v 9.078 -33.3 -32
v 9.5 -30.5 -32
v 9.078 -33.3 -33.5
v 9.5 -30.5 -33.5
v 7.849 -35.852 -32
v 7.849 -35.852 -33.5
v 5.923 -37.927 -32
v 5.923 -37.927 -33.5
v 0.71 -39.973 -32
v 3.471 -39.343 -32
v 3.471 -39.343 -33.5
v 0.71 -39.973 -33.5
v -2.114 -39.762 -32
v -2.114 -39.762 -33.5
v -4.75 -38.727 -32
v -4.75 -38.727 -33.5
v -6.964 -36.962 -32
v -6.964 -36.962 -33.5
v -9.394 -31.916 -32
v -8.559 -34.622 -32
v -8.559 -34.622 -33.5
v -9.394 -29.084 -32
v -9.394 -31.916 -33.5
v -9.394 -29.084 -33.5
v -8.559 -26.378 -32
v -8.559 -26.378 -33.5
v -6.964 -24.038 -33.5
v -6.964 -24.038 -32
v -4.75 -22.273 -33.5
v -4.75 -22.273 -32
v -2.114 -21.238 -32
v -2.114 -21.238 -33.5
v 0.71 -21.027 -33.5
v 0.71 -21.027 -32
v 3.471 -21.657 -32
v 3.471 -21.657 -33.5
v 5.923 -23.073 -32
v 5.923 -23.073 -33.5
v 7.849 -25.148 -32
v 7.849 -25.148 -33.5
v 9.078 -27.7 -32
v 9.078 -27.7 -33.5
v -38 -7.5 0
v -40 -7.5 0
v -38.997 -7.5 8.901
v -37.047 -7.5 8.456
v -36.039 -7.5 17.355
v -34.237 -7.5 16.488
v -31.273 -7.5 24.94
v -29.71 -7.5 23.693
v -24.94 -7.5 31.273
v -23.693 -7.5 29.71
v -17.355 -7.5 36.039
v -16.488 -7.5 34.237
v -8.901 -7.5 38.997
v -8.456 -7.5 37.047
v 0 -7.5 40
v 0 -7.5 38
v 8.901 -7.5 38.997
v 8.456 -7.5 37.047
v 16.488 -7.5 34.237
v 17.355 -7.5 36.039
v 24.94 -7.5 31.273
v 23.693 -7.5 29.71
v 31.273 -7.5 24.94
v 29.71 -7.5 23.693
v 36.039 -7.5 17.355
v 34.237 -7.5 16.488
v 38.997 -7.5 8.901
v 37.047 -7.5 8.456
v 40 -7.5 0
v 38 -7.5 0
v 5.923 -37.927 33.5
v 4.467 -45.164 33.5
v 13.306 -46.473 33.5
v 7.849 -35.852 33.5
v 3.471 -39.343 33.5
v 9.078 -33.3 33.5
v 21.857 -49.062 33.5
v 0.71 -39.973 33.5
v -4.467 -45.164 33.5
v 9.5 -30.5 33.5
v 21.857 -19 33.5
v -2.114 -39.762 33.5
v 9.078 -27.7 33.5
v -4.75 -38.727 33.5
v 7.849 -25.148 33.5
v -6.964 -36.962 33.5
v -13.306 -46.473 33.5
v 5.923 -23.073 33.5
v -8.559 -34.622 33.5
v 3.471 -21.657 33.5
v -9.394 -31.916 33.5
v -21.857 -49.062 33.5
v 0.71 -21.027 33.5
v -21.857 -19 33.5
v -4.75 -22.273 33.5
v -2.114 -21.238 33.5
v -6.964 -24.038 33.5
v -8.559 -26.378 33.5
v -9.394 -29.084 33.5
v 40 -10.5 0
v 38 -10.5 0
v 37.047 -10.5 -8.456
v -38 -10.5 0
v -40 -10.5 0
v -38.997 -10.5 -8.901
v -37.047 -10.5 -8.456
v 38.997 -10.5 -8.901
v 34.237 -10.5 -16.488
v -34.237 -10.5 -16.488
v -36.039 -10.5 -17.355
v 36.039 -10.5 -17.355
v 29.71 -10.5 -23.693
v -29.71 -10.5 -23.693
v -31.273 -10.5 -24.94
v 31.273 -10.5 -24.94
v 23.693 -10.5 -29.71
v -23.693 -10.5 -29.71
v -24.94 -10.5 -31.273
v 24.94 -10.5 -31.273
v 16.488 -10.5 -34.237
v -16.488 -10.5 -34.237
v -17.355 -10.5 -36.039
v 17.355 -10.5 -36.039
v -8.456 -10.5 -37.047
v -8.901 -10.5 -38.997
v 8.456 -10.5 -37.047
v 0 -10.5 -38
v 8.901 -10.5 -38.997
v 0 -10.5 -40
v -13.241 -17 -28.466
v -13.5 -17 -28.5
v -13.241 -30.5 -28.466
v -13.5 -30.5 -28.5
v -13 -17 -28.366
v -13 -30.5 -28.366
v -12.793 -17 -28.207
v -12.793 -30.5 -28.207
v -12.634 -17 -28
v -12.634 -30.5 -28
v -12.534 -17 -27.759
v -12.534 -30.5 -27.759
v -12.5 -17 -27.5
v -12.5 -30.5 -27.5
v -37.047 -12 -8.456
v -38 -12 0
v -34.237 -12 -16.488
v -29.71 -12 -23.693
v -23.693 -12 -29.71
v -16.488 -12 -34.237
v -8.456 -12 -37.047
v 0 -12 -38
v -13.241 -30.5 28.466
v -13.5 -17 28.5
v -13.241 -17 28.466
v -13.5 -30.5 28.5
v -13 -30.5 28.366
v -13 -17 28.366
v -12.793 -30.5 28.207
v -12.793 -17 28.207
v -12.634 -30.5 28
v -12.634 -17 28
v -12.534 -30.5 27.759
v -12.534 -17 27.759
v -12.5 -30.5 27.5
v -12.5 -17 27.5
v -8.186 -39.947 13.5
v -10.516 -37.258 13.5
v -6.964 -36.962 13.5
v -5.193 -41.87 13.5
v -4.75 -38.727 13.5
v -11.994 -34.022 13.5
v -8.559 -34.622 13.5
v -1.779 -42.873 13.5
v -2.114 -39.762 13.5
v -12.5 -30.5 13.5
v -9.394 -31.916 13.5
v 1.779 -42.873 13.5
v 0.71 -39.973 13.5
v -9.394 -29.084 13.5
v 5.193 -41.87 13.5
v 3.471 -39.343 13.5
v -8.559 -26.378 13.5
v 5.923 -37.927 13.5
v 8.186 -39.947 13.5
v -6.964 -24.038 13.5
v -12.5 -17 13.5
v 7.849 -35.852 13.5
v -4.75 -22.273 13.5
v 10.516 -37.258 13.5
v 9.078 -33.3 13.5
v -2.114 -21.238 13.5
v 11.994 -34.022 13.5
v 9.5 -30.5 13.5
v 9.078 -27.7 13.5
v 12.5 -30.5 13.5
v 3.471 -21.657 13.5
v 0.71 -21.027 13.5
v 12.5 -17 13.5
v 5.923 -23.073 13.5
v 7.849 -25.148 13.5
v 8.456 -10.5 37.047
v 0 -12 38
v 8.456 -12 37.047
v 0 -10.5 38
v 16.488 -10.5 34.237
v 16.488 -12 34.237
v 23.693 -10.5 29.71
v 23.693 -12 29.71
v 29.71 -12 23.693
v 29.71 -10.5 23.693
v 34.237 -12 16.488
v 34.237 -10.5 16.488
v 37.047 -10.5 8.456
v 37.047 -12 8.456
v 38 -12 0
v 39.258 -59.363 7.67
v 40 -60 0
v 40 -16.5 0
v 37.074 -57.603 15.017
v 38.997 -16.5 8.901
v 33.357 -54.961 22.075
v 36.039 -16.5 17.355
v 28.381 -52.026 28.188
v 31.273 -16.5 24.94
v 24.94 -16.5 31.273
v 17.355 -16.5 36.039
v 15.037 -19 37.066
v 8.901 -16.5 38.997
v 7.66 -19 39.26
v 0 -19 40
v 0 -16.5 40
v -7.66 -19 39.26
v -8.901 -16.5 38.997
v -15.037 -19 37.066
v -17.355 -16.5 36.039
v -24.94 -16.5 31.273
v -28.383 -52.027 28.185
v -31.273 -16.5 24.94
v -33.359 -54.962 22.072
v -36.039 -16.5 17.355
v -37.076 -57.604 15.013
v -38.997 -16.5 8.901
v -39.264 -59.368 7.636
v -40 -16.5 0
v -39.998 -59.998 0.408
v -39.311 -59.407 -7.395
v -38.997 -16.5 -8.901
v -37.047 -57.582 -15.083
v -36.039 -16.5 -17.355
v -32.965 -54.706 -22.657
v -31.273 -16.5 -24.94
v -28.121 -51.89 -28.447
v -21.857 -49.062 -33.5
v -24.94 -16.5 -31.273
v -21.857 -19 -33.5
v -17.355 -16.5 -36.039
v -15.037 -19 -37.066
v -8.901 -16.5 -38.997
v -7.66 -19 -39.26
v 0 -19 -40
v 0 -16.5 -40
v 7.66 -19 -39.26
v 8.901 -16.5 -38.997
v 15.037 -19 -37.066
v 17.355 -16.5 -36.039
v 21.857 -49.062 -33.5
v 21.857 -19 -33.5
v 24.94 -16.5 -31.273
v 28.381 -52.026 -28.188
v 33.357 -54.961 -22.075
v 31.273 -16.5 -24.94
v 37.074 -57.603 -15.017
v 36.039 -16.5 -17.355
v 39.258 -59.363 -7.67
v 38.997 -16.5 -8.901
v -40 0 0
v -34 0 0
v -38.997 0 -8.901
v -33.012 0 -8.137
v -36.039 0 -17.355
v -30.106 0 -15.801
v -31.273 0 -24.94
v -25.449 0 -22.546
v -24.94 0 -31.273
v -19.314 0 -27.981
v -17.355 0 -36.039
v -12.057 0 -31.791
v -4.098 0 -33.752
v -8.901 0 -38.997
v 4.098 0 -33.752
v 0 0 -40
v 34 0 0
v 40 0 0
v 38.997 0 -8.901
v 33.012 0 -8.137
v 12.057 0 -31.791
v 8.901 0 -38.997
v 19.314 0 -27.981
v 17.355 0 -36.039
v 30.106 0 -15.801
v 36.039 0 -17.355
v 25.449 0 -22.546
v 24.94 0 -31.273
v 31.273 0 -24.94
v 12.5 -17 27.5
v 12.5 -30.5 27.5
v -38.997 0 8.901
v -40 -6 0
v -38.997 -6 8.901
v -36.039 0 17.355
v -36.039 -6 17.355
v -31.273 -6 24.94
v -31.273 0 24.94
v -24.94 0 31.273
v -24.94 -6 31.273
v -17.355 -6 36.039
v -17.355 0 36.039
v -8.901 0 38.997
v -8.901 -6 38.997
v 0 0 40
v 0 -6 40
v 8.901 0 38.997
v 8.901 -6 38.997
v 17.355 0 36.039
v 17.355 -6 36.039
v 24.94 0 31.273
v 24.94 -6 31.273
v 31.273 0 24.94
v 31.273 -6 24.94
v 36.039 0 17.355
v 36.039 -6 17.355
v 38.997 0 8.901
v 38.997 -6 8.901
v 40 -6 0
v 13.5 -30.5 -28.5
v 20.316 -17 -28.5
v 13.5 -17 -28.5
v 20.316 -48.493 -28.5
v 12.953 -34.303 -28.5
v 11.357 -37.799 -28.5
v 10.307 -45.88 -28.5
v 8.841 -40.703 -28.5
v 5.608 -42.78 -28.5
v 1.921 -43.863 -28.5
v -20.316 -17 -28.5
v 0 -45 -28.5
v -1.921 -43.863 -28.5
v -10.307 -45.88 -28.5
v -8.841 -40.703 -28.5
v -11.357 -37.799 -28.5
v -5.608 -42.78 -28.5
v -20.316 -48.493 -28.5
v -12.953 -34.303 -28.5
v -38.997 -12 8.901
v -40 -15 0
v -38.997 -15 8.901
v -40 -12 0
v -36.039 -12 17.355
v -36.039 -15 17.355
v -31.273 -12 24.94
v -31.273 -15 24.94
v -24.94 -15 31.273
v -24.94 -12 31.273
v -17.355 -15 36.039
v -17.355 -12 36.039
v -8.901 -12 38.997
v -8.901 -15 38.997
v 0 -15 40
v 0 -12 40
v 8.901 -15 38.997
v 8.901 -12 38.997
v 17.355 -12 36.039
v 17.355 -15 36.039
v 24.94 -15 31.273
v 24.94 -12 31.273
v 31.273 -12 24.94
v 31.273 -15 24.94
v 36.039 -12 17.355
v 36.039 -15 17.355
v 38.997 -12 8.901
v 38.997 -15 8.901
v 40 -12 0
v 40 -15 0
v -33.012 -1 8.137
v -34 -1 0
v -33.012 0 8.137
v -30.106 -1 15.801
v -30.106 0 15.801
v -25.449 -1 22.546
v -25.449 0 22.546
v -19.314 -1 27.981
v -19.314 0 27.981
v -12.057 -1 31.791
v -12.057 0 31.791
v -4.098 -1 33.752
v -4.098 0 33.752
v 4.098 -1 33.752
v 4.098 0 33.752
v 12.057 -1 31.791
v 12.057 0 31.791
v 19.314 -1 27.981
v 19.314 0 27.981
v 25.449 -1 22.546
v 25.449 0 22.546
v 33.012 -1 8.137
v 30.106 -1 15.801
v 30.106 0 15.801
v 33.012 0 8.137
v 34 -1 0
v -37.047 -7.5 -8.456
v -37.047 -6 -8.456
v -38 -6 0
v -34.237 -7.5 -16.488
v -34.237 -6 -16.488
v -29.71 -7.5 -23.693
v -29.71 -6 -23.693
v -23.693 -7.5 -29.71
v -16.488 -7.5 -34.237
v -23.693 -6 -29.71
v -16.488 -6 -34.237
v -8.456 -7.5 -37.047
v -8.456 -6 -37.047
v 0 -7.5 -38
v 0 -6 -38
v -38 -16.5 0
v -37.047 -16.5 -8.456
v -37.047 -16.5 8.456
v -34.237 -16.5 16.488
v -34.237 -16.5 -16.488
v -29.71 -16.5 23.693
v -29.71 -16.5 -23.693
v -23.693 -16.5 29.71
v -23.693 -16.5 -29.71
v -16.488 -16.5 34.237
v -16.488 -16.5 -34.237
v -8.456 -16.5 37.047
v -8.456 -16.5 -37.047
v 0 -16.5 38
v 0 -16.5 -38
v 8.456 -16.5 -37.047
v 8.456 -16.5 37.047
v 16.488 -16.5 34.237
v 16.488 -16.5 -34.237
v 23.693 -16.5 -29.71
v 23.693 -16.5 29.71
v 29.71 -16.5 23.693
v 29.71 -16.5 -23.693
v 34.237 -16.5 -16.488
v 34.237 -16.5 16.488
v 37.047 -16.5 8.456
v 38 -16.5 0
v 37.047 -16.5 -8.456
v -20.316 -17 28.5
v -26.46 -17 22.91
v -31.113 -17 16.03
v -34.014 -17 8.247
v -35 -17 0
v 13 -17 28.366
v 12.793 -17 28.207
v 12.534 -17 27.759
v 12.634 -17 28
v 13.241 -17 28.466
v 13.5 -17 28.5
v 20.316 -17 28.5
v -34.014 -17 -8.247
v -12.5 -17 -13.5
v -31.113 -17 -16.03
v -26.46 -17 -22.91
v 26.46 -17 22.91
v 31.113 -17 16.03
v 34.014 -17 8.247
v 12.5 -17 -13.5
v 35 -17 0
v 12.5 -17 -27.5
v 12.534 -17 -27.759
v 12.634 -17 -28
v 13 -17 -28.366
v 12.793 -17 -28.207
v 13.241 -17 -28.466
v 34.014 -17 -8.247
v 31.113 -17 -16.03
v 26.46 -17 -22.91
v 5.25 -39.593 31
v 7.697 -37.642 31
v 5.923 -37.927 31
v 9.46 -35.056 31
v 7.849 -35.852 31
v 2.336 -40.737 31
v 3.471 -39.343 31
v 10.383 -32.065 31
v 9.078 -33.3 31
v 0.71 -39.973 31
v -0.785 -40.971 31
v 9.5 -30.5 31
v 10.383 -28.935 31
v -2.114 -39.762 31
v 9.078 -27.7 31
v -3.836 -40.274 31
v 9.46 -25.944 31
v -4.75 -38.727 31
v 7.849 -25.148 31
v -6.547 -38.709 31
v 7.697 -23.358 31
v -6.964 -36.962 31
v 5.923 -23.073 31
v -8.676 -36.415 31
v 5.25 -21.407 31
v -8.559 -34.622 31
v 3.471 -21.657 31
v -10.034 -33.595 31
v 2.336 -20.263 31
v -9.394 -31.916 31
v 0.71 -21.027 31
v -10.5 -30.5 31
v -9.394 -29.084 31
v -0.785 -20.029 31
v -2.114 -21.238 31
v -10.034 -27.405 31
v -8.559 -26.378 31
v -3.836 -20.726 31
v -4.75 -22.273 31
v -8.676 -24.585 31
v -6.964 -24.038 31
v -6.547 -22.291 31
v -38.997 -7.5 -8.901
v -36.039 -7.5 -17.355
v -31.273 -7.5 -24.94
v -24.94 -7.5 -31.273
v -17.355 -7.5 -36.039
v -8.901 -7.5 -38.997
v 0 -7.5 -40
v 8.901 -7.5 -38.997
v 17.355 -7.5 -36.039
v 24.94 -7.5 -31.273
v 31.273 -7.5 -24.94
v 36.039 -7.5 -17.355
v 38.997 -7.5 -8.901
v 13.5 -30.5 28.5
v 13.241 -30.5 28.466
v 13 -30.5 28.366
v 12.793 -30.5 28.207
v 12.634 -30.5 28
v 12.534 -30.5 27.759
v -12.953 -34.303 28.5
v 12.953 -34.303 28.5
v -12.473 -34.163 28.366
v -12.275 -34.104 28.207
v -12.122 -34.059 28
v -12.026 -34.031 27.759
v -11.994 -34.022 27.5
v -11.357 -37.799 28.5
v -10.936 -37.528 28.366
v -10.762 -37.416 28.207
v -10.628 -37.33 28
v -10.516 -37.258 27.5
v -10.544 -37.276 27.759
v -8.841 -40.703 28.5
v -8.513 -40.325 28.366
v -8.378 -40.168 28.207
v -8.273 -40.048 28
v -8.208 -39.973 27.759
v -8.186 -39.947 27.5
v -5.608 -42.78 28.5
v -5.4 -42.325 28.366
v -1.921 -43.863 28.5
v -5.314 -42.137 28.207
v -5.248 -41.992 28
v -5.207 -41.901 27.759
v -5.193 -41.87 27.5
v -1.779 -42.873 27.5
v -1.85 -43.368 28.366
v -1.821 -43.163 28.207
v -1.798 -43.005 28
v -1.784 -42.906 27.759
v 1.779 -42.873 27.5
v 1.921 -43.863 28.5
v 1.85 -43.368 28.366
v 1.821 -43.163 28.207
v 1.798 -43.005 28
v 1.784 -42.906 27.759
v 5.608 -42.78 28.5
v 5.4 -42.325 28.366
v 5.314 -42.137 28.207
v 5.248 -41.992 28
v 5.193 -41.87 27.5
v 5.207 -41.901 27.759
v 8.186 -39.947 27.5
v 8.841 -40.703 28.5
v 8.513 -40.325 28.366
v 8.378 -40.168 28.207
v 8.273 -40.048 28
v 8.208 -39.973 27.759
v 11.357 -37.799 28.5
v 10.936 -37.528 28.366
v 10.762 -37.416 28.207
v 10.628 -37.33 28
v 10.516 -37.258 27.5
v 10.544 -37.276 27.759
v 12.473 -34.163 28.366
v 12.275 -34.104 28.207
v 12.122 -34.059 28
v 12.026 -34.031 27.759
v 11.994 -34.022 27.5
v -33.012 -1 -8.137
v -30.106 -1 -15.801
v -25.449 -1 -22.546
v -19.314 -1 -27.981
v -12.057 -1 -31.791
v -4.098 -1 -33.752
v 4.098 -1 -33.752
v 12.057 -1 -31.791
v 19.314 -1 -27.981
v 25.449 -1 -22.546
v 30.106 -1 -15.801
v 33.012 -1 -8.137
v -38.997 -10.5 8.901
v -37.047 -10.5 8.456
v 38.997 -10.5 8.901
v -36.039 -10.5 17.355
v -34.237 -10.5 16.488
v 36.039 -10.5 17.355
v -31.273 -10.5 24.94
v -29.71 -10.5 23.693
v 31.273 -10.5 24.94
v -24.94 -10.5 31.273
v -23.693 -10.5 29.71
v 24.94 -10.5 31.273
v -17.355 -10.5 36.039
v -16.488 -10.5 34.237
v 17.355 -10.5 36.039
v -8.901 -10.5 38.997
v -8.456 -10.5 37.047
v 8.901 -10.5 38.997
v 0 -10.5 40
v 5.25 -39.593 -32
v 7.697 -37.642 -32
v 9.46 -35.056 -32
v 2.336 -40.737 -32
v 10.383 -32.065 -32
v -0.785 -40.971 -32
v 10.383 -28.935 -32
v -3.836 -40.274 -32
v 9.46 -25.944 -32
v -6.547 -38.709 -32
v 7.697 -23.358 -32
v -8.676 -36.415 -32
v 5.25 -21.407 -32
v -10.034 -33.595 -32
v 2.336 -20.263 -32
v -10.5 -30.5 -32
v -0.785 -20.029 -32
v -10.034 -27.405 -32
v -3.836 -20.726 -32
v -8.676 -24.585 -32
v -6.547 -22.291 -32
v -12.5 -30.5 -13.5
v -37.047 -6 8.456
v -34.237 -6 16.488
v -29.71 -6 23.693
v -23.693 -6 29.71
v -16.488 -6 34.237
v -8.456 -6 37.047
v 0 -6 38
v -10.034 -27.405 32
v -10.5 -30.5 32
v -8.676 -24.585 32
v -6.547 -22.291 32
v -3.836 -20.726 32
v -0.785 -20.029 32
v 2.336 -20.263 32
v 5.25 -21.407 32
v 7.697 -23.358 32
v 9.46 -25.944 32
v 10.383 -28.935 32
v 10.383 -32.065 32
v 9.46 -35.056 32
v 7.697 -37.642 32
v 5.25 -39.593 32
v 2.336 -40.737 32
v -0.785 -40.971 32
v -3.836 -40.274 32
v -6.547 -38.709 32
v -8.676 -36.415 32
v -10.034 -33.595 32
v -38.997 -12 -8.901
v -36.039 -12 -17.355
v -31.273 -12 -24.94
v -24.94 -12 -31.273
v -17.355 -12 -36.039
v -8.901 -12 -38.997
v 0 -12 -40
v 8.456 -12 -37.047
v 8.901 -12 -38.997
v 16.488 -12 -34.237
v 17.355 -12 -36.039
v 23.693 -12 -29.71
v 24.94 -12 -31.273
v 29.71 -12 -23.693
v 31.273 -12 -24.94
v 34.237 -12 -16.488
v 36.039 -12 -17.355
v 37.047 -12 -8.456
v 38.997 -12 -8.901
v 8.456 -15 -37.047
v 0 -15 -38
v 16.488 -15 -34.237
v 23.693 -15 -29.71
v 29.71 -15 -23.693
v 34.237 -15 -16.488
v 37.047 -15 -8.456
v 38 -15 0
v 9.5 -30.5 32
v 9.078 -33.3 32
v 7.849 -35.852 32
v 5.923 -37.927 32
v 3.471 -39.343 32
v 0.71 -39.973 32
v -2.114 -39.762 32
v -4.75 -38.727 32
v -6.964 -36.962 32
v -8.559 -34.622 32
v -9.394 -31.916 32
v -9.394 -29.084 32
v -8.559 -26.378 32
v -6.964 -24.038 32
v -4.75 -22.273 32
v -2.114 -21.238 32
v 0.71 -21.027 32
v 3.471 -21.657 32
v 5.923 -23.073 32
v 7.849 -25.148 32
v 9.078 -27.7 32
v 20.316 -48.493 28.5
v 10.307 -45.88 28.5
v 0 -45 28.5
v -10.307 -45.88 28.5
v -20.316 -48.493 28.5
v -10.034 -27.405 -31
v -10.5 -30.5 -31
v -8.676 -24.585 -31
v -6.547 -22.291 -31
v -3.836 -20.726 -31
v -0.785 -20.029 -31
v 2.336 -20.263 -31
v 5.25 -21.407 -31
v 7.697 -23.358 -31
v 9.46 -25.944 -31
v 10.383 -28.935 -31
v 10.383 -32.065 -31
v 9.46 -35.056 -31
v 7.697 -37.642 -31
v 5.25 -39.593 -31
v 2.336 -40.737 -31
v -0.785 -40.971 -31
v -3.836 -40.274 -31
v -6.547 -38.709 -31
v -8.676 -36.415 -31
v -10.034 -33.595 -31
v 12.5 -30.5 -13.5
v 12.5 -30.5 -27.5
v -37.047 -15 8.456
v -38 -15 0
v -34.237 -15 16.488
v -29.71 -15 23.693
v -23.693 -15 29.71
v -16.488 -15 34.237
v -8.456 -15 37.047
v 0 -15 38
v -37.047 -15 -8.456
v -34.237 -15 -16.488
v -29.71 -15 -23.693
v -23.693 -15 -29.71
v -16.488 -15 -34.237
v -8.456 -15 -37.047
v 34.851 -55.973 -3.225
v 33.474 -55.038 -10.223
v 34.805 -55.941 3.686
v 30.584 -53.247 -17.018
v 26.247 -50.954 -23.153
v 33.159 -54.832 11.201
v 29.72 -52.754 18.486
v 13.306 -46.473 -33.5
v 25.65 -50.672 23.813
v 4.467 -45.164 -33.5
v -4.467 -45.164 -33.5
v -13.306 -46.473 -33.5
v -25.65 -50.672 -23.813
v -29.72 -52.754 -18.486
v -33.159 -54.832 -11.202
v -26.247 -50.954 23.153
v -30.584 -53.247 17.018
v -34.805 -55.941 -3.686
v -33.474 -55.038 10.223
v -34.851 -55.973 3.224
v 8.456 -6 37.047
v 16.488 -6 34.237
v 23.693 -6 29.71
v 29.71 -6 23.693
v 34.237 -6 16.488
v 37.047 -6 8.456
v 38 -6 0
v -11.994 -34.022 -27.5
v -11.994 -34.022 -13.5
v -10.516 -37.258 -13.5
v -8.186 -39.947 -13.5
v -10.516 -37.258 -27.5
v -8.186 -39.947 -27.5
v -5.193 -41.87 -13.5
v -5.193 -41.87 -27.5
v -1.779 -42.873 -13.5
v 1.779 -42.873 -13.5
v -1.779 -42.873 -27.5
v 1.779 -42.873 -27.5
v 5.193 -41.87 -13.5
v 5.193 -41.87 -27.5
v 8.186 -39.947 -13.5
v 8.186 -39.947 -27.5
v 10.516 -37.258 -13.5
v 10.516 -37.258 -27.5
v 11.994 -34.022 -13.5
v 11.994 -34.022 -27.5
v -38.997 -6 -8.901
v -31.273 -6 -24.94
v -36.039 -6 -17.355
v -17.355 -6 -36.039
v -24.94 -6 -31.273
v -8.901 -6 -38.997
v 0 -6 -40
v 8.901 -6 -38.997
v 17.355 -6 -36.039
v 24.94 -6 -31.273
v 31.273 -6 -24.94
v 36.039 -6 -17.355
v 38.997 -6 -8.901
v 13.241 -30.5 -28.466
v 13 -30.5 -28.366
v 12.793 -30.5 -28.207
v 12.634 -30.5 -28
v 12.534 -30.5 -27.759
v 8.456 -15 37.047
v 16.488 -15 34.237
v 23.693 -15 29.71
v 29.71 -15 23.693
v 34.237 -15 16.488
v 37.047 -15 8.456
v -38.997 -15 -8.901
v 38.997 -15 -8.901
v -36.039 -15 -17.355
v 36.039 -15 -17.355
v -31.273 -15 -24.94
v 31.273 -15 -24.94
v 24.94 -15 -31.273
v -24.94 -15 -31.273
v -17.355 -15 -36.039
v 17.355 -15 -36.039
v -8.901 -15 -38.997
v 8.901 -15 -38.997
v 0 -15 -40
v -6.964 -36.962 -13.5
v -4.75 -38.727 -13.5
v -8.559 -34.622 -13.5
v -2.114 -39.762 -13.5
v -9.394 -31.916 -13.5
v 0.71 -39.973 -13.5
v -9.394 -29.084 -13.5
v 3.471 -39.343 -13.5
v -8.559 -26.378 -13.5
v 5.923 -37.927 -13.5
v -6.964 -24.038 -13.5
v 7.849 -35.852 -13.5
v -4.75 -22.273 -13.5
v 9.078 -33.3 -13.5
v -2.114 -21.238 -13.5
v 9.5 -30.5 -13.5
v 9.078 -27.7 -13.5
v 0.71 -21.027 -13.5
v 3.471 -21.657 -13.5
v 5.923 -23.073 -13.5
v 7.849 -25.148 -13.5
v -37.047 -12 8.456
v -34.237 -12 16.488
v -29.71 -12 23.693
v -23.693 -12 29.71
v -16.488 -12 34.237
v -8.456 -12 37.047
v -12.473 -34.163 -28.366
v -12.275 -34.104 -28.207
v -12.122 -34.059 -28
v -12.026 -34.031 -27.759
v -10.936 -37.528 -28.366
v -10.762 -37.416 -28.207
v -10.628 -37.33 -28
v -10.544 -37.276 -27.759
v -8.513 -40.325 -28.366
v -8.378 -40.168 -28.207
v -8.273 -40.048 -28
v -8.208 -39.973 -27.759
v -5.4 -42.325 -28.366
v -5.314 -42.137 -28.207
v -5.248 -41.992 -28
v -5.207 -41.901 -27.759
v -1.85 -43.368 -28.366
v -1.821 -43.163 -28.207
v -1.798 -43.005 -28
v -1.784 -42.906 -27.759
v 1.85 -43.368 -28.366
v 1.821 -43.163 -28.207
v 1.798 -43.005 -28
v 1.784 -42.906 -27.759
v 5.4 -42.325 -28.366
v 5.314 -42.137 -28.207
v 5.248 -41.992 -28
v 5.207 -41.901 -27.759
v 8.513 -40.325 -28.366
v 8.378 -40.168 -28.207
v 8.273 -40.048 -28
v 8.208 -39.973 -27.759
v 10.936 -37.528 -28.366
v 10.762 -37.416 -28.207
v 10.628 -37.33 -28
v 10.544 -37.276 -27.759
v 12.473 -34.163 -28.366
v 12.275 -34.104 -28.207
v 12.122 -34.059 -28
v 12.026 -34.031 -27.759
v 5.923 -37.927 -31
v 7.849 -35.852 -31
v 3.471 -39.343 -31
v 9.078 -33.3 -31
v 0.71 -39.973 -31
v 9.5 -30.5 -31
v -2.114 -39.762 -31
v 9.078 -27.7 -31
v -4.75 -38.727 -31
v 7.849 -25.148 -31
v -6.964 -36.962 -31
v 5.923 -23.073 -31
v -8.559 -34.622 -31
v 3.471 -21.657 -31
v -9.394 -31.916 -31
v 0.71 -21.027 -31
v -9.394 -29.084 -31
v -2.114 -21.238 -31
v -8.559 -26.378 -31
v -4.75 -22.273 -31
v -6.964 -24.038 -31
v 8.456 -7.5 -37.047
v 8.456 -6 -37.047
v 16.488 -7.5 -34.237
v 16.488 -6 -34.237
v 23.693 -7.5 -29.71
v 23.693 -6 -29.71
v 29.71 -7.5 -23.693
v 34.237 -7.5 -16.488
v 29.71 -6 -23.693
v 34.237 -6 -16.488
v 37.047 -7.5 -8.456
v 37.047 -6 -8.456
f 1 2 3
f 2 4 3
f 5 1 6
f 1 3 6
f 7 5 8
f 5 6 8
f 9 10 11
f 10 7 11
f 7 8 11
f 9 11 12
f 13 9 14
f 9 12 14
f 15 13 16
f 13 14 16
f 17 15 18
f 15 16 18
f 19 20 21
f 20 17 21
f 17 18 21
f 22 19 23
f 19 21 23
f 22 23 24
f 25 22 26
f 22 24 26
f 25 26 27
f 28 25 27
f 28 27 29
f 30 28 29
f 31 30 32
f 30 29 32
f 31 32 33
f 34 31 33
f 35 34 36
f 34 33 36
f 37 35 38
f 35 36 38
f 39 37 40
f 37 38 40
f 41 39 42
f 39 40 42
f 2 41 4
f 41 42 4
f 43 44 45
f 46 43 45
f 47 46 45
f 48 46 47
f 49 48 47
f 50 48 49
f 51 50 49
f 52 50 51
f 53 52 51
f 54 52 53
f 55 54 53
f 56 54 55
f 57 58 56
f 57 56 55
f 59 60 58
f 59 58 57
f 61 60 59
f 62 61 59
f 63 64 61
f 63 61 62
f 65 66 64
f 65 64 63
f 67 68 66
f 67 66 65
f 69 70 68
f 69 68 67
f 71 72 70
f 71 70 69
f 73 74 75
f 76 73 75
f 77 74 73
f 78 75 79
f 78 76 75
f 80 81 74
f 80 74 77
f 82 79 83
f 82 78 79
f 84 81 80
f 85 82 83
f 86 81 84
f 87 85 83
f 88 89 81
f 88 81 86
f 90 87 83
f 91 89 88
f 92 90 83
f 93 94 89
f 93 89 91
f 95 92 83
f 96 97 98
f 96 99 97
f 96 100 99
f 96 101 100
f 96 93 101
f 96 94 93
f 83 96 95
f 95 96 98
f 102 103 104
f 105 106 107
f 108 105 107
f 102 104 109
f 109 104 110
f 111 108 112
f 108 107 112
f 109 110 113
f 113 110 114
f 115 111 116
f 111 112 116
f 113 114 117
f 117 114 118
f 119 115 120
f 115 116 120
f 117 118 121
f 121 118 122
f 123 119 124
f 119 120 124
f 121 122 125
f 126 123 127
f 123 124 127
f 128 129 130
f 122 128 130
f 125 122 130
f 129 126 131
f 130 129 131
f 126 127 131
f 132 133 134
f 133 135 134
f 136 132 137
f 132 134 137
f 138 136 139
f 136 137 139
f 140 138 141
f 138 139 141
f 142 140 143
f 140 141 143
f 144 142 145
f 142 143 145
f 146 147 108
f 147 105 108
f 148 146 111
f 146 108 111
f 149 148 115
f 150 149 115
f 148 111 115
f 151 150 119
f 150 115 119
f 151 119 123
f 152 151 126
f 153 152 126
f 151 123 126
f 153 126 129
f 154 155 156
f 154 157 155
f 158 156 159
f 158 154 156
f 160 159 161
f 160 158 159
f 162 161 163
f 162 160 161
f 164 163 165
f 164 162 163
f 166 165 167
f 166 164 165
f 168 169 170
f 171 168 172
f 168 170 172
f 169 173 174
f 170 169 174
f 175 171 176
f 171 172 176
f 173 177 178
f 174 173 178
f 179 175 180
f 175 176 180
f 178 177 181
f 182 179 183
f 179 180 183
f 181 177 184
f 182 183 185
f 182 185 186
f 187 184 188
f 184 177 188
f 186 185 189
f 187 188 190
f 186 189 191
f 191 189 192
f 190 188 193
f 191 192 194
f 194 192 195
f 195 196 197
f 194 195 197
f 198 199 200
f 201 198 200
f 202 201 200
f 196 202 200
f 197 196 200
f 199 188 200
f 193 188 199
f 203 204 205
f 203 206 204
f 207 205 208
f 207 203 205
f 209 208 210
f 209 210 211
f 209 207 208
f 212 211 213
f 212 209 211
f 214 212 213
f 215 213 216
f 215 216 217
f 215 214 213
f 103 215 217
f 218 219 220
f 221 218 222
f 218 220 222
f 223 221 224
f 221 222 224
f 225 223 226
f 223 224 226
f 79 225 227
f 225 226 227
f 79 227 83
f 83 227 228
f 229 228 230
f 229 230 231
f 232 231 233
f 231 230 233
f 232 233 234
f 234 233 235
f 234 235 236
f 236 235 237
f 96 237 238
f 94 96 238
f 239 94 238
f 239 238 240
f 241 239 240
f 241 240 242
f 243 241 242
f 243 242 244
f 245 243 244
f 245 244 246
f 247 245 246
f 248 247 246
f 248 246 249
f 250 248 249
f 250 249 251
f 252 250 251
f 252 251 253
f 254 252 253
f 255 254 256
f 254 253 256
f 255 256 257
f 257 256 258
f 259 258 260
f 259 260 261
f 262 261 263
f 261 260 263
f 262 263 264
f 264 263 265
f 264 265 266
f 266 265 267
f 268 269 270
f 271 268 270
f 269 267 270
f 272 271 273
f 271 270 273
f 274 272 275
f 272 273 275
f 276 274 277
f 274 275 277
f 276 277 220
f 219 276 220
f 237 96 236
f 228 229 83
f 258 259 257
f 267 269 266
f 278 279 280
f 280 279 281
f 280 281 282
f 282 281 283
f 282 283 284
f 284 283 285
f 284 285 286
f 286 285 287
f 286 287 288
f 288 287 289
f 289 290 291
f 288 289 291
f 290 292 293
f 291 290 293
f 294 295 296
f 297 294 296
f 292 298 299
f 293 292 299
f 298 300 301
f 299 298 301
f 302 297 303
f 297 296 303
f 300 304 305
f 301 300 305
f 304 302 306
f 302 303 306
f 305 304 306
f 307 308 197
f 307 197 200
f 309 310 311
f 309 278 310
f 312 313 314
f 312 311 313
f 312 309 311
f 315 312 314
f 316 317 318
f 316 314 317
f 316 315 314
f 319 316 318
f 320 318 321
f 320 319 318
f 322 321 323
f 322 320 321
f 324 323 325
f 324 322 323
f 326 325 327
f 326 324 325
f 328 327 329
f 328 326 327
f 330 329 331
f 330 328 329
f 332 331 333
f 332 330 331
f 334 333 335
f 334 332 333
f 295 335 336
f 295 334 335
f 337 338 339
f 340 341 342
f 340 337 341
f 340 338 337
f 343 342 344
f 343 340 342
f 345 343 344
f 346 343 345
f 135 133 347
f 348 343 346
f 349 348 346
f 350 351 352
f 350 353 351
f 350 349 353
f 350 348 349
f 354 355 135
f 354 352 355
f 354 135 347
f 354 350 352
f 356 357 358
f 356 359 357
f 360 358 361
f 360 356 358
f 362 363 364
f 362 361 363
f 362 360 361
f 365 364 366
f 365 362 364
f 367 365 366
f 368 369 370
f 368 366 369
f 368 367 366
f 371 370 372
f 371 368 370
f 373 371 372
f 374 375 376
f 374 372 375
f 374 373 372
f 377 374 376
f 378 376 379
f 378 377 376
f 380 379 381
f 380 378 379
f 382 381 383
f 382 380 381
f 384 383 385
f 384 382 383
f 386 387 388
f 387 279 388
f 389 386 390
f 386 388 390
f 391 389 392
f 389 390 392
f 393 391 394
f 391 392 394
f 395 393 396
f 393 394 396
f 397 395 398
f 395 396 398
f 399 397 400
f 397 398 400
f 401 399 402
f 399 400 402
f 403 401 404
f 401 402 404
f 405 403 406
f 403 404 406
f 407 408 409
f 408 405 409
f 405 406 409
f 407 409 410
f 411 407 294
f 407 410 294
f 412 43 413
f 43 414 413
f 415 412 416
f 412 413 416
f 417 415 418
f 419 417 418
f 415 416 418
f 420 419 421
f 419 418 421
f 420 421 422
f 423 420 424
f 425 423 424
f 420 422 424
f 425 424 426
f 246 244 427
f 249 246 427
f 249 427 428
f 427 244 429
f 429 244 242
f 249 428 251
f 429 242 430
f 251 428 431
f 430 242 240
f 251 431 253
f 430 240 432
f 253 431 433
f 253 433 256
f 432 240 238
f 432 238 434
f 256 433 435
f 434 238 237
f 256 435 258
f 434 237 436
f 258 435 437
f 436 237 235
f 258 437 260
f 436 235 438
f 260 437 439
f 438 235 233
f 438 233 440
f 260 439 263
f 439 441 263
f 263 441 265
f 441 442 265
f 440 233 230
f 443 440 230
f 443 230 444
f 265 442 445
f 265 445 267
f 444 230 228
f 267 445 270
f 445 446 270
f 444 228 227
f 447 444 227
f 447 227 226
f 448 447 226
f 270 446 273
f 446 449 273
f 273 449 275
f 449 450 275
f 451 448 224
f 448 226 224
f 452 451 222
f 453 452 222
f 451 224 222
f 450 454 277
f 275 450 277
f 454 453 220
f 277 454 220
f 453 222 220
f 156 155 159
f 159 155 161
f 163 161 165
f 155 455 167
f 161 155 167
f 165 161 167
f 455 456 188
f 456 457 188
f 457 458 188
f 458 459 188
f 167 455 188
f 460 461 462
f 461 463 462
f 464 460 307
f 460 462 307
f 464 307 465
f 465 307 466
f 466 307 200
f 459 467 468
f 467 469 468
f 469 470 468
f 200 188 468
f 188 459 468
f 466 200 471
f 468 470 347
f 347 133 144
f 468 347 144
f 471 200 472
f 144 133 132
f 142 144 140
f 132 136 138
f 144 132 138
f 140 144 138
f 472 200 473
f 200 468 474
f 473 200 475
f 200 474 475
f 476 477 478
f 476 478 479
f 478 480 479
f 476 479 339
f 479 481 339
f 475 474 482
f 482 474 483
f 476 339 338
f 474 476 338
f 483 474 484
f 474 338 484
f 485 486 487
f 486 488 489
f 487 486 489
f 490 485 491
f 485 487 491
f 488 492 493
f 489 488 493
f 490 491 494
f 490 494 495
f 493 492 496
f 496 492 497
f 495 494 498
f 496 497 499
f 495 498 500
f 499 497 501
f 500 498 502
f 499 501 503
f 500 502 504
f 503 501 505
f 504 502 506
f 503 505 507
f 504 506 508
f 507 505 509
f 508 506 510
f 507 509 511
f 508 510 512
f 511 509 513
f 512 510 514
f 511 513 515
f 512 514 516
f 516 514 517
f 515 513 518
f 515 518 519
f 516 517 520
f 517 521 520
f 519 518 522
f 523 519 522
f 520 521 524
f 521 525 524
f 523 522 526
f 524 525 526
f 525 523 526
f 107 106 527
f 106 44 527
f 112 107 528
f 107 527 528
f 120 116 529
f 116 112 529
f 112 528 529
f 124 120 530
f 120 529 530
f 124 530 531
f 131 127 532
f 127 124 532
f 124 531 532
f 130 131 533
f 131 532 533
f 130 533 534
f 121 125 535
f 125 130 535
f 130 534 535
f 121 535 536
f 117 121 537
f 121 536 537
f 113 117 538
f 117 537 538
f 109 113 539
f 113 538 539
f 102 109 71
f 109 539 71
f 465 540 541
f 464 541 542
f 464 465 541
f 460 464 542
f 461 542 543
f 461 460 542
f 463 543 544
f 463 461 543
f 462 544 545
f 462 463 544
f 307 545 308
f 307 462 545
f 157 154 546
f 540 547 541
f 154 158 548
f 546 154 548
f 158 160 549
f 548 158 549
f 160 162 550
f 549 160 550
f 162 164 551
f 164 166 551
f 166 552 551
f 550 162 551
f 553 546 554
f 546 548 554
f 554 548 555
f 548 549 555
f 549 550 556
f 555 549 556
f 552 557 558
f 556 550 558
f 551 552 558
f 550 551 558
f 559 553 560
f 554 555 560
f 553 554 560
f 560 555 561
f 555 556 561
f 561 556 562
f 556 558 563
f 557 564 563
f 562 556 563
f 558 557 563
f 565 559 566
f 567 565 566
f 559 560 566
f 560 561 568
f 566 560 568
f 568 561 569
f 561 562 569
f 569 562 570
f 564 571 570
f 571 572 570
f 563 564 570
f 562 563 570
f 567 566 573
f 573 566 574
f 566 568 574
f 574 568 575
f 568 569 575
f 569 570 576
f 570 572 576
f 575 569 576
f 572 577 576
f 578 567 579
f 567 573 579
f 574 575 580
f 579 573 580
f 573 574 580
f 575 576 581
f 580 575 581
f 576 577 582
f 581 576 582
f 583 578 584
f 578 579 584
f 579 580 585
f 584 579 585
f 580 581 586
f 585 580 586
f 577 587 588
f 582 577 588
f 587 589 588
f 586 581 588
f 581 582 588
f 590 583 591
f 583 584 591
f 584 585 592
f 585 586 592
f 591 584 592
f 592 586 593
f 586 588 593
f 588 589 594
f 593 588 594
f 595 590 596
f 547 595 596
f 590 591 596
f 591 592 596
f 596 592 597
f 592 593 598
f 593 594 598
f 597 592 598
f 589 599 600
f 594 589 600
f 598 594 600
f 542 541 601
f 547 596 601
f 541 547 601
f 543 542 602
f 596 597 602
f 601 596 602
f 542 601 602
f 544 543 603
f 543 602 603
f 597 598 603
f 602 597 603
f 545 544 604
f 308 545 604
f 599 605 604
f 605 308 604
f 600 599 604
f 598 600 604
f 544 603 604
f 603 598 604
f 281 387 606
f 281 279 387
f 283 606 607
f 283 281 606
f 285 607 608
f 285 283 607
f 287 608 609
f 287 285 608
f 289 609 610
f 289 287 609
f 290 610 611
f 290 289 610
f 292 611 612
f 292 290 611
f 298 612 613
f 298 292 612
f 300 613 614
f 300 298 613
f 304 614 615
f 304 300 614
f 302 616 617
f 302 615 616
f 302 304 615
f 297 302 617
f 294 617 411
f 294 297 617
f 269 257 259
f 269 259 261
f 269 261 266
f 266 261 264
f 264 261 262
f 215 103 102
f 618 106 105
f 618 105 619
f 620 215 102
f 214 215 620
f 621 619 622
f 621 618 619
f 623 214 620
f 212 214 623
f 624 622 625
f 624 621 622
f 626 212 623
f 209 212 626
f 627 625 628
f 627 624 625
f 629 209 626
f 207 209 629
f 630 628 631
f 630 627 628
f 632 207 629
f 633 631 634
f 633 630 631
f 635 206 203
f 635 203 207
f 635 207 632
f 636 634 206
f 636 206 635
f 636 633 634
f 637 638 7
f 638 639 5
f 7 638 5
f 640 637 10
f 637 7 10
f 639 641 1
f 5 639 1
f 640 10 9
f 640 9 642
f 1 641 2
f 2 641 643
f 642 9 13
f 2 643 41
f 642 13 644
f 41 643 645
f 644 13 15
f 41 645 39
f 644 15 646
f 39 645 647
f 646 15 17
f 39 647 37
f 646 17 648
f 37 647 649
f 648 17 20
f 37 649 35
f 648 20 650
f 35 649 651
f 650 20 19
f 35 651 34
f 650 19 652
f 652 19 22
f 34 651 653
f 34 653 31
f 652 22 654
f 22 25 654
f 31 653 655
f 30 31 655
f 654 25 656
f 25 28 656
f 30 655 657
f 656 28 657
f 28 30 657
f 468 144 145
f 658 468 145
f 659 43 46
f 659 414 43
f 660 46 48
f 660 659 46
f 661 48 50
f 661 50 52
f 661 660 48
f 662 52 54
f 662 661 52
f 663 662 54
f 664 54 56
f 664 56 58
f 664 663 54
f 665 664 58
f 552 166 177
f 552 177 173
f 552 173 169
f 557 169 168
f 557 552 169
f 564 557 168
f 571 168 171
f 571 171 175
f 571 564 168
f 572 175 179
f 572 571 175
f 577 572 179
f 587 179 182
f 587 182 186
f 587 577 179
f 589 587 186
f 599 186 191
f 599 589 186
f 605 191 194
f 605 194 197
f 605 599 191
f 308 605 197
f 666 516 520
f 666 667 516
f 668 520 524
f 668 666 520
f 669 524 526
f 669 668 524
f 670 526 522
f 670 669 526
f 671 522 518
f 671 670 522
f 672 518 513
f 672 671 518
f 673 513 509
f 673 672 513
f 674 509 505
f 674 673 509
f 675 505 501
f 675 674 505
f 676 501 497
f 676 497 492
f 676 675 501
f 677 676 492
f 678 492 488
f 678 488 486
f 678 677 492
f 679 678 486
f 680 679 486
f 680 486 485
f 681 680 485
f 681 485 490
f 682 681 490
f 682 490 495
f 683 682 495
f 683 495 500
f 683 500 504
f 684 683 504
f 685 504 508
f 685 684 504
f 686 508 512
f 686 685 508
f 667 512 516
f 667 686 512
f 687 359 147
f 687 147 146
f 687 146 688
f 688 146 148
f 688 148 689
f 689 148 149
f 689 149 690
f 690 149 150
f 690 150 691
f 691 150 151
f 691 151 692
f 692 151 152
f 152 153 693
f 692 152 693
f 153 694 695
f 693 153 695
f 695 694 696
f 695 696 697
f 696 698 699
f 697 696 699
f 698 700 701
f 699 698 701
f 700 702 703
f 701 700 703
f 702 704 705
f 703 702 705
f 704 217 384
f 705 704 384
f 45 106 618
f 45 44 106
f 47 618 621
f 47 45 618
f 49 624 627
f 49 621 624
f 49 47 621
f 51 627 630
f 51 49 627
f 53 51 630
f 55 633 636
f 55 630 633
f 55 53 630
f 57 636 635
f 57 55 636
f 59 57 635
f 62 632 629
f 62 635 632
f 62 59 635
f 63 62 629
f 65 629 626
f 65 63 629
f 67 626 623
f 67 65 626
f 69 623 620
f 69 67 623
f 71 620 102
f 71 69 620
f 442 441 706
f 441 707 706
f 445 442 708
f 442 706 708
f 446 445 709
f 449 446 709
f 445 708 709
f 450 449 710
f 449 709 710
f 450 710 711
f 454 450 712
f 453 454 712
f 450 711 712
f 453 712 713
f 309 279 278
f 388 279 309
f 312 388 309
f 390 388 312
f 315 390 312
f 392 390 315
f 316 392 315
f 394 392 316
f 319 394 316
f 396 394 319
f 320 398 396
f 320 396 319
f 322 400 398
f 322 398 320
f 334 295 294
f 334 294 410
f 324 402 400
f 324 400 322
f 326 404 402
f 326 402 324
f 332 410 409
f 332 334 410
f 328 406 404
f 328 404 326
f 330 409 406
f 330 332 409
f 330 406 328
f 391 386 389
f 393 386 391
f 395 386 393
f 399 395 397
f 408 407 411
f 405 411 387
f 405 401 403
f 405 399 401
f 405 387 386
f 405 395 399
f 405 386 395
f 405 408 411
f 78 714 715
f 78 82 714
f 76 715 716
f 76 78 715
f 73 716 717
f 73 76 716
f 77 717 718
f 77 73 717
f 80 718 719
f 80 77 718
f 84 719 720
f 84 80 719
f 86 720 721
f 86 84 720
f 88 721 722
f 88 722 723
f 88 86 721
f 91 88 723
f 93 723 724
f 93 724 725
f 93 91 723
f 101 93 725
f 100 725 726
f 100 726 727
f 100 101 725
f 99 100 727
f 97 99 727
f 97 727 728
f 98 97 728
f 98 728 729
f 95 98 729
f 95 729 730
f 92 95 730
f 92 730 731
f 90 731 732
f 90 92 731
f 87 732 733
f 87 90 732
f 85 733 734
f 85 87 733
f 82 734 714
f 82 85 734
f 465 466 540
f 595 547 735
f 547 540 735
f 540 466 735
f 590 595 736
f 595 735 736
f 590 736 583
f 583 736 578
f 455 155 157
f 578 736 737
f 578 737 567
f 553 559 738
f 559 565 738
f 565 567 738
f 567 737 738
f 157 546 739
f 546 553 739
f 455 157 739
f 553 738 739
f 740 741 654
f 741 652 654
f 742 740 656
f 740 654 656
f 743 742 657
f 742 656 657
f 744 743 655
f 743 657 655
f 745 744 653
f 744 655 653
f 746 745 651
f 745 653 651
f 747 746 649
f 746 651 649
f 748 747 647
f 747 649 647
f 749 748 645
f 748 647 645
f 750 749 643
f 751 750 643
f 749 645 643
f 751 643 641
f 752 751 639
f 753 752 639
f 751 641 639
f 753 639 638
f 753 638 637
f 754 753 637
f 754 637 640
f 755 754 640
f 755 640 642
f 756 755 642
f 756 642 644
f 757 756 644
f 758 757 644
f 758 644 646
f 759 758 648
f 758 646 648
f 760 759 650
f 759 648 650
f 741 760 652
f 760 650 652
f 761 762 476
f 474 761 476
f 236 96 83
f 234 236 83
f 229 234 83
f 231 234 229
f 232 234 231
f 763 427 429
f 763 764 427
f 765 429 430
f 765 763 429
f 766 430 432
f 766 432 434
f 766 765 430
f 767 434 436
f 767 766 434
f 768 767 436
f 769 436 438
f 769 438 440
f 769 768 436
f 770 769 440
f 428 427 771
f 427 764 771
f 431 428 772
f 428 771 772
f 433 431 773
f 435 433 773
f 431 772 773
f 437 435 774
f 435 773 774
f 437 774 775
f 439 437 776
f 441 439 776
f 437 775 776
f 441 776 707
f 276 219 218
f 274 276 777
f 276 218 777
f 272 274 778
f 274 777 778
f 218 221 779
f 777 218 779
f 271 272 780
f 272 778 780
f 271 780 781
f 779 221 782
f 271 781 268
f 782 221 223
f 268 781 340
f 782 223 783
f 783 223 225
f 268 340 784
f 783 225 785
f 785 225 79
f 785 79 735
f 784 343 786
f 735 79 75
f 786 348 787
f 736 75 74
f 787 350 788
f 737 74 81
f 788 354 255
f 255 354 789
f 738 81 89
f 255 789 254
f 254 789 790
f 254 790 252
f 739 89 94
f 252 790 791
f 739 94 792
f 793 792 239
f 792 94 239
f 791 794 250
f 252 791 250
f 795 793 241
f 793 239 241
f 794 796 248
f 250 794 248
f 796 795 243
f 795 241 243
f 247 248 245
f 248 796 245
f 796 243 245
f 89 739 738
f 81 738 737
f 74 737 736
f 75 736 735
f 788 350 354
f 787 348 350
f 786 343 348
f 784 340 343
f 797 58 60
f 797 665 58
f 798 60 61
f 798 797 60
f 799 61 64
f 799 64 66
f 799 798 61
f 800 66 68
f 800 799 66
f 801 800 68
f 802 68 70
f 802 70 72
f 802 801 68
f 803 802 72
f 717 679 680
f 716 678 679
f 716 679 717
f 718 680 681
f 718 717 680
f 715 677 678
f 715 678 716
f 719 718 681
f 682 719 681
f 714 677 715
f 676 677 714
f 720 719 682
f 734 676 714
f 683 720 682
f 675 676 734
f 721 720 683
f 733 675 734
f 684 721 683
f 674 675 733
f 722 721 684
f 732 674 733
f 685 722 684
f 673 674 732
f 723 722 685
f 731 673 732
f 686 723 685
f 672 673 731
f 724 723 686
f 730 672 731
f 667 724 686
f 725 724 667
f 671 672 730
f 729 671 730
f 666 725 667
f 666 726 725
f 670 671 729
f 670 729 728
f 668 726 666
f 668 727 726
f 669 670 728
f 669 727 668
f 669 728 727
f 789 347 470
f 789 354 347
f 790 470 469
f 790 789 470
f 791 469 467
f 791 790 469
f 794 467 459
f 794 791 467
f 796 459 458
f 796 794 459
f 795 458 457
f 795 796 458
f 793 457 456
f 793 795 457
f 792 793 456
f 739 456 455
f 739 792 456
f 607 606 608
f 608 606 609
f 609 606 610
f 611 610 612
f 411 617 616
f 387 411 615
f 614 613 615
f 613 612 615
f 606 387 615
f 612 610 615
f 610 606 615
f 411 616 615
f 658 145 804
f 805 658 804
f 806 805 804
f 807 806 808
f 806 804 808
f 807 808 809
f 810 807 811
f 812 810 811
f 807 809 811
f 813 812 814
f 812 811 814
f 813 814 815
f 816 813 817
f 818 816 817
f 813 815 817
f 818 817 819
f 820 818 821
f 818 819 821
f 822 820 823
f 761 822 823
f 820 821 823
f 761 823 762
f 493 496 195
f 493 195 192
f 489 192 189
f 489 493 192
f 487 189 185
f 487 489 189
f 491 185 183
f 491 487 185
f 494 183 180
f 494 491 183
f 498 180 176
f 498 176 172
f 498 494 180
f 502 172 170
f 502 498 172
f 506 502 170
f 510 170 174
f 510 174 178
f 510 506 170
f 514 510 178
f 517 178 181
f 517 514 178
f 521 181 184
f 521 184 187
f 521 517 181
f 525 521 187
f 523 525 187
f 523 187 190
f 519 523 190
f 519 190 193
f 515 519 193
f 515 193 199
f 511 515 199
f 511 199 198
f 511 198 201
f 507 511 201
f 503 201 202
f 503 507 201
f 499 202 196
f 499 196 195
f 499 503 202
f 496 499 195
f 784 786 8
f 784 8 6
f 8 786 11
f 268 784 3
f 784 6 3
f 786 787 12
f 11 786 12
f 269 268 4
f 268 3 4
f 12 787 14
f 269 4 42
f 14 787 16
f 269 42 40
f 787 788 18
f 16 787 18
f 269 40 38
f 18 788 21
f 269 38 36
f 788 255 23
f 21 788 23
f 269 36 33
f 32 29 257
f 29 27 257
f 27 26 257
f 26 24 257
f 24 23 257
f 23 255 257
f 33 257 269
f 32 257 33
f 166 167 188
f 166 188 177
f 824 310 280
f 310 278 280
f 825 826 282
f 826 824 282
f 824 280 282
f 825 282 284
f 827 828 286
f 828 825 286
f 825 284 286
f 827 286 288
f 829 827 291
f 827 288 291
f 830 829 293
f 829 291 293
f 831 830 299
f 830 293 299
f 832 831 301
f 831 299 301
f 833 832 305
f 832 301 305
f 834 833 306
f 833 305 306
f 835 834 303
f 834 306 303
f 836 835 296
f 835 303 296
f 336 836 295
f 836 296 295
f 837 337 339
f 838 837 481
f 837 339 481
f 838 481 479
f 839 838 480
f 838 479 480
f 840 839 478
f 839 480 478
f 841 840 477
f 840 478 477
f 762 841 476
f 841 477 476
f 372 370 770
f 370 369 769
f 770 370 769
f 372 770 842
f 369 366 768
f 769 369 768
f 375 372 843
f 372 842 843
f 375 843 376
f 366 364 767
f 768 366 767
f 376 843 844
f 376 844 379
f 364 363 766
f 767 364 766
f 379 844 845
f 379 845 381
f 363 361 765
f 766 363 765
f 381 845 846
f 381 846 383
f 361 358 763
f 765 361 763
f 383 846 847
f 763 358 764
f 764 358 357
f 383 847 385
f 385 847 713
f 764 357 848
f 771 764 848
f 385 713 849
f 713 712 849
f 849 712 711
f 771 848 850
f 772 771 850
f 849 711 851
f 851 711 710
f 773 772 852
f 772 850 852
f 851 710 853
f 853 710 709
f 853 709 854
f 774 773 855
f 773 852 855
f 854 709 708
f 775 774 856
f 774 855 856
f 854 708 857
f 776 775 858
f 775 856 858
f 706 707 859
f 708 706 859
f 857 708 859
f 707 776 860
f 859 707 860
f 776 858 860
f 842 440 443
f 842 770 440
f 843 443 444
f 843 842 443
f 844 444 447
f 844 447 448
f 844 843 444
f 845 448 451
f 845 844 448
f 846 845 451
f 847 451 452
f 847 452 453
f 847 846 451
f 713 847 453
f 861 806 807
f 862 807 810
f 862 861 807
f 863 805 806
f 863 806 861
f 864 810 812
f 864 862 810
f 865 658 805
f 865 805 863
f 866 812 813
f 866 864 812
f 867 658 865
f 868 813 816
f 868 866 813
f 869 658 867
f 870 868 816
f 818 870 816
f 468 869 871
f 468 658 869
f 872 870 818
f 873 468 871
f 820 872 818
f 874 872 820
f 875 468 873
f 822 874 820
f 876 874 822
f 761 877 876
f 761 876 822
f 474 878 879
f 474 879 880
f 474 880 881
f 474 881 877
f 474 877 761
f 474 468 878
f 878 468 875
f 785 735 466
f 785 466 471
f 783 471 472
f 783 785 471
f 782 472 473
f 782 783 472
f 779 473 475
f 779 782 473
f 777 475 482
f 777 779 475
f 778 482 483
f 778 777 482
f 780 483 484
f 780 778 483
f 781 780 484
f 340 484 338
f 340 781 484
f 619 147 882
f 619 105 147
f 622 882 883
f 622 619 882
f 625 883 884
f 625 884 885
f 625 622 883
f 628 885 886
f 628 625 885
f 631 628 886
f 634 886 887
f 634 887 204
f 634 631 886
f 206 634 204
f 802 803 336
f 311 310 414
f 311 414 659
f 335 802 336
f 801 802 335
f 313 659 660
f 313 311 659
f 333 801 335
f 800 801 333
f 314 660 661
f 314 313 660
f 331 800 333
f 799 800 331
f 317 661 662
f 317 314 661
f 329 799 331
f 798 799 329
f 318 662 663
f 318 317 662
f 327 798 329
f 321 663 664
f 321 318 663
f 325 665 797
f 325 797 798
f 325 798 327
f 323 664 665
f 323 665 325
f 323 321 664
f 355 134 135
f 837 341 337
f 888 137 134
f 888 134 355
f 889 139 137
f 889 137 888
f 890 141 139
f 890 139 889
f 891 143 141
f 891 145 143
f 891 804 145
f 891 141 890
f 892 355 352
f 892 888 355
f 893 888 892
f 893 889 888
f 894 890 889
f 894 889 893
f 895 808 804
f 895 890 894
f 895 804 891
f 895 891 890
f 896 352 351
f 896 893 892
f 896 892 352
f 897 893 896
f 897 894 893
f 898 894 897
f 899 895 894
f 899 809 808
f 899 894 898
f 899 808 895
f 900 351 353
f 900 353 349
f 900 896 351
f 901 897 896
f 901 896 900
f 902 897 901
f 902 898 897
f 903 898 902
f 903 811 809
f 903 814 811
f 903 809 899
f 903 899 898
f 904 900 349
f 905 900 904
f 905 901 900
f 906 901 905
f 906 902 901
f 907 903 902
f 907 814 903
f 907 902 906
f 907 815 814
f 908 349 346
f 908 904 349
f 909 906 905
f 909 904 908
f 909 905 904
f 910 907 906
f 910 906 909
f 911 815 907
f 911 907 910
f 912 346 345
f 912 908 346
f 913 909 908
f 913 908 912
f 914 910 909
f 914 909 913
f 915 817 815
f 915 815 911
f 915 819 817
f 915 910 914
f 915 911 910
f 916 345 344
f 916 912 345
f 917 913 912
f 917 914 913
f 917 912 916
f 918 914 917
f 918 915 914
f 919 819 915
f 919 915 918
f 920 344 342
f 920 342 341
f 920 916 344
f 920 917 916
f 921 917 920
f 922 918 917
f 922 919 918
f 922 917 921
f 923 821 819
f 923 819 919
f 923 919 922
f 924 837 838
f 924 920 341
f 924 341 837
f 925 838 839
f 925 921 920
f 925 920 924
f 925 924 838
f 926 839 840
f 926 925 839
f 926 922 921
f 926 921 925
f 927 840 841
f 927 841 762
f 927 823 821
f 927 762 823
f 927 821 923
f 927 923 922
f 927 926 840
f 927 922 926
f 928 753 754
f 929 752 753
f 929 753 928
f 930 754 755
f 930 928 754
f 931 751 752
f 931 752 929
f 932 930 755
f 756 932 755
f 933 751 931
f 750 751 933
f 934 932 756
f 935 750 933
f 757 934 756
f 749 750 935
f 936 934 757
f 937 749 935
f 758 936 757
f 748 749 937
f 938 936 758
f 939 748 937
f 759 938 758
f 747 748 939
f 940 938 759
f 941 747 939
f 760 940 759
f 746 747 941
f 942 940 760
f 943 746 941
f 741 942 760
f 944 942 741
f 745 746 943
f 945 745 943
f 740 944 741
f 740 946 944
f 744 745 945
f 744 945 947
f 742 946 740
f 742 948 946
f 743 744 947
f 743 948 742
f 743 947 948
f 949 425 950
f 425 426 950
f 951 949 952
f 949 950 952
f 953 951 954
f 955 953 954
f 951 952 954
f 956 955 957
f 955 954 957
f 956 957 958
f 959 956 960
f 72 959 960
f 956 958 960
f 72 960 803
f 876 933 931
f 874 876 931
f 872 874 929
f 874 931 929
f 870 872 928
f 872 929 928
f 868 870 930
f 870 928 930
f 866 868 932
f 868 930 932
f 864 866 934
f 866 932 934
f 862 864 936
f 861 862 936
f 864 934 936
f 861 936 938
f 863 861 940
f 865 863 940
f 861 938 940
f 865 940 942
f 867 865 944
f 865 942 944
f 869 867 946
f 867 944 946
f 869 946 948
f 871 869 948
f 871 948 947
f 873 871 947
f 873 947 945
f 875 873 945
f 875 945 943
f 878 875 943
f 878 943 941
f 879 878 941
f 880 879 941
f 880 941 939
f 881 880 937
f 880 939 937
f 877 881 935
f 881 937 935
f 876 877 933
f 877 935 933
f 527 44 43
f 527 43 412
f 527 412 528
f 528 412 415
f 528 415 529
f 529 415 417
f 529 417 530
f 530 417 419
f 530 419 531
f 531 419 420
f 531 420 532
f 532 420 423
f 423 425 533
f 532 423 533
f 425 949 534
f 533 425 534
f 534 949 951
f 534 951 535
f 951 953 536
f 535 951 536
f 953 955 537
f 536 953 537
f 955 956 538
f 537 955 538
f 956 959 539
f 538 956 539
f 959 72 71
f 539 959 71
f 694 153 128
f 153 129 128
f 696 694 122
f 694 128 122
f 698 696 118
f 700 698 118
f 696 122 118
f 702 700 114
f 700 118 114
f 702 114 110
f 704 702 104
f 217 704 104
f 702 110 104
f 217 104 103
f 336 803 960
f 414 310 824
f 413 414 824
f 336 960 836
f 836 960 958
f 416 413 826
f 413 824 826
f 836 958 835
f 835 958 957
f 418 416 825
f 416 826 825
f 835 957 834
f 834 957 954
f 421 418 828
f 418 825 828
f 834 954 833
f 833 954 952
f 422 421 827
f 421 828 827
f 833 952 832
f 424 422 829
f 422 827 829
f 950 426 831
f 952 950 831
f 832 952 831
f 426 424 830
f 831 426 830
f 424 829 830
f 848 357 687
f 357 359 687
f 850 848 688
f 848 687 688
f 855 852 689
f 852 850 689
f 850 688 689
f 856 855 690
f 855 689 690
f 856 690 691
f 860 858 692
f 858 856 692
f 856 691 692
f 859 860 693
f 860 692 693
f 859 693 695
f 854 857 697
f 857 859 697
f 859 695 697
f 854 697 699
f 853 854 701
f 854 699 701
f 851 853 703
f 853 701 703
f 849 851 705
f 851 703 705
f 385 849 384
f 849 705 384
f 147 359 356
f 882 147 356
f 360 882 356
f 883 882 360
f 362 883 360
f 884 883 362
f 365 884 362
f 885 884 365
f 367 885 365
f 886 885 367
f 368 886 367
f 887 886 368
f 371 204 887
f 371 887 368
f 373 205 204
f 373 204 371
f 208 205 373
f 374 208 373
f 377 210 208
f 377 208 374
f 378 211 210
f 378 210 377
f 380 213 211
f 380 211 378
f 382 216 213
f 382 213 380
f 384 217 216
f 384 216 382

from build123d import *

# Parameters (mm, degrees)
CROQUIS7_R                 = 40
SALIENTE_EXTRUIR3_DEPTH    = 60
CORTAR_EXTRUIR2_DEPTH      = 83.462112512
CORTAR_EXTRUIR2_DEPTH_BACK = 83.462112512
CROQUIS8_W                 = 6.5
CROQUIS8_H                 = 41
CROQUIS9_W                 = 4
CROQUIS9_H                 = 1.5
CORTAR_EXTRUIR3_DEPTH      = 43
CROQUIS11_R                = 34
CORTAR_EXTRUIR4_DEPTH      = 1
CROQUIS12_R                = 9.5
CORTAR_EXTRUIR5_DEPTH      = 110
CORTAR_EXTRUIR6_DEPTH      = 83.462112512
CORTAR_EXTRUIR6_DEPTH_BACK = 83.462112512
CROQUIS13_R                = 60.833333333
CROQUIS14_R                = 9.5
SALIENTE_EXTRUIR4_DEPTH    = 15
REDONDEO1_R                = 1
CROQUIS15_R                = 10.5
CROQUIS15_R_2              = 9.5
CORTAR_EXTRUIR7_DEPTH      = 0.5


# Read off the part's stored shape, not the designer's step: Simetría6
with BuildPart() as part:
    # Croquis7 → Saliente-Extruir3 (new body)
    with BuildSketch(Plane(origin=(0, 0, 0), x_dir=(1, 0, 0), z_dir=(0, 1, 0))):
        with Locations(Location((0, 0, 0), (0, 0, 270))):
            Circle(CROQUIS7_R)
    extrude(amount=-SALIENTE_EXTRUIR3_DEPTH)

    # Croquis8 → Cortar-Extruir2 (cut, two sides: drawn at the far end of the back side and taken through both)
    with BuildSketch(Plane(origin=(0, 0, 0), x_dir=(0, 0, -1), z_dir=(1, 0, 0)).offset(-CORTAR_EXTRUIR2_DEPTH_BACK)):
        with Locations((36.75, -39.5)):
            Rectangle(CROQUIS8_W, CROQUIS8_H)
        with Locations((-36.75, -39.5)):
            Rectangle(CROQUIS8_W, CROQUIS8_H)
    extrude(amount=CORTAR_EXTRUIR2_DEPTH + CORTAR_EXTRUIR2_DEPTH_BACK, mode=Mode.SUBTRACT)

    # Cortar-Barrer2: sweep along a curve in space
    with BuildLine() as cortar_barrer2_path:
        ThreePointArc((0, 0, 40), (28.284271247, 0, 28.284271247), (40, 0, 0))
        ThreePointArc((40, 0, 0), (28.284271247, 0, -28.284271247), (0, 0, -40))
        ThreePointArc((0, 0, -40), (-28.284271247, 0, -28.284271247), (-40, 0, 0))
        ThreePointArc((-40, 0, 0), (-28.284271247, 0, 28.284271247), (0, 0, 40))
    # Croquis9 → Cortar-Barrer2 (sweep, cut)
    with BuildSketch(Plane(origin=(0, 0, 0), x_dir=(0, 0, -1), z_dir=(1, 0, 0))):
        with Locations((-40, -6.75)):
            Rectangle(CROQUIS9_W, CROQUIS9_H)
        with Locations((-40, -11.25)):
            Rectangle(CROQUIS9_W, CROQUIS9_H)
        with Locations((-40, -15.75)):
            Rectangle(CROQUIS9_W, CROQUIS9_H)
    sweep(path=cortar_barrer2_path.line, mode=Mode.SUBTRACT)

    # Croquis10 → Cortar-Extruir3 (cut)
    with BuildSketch(Plane.XZ.offset(60)):
        with BuildLine():
            Line((-20.316249654, -28.5), (20.316249654, -28.5))
            ThreePointArc((20.316249654, -28.5), (35, 0), (20.316249654, 28.5))
            Line((20.316249654, 28.5), (-20.316249654, 28.5))
            ThreePointArc((-20.316249654, 28.5), (-35, 0), (-20.316249654, -28.5))
        make_face()
    extrude(amount=-CORTAR_EXTRUIR3_DEPTH, mode=Mode.SUBTRACT)

    # Croquis11 → Cortar-Extruir4 (cut)
    with BuildSketch(Plane(origin=(0, 0, 0), x_dir=(1, 0, 0), z_dir=(0, 1, 0))):
        with Locations(Location((0, 0, 0), (0, 0, 270))):
            Circle(CROQUIS11_R)
    extrude(amount=-CORTAR_EXTRUIR4_DEPTH, mode=Mode.SUBTRACT)

    # Croquis12 → Cortar-Extruir5 (cut)
    with BuildSketch(Plane.XY.offset(33.5)):
        with Locations((0, -30.5)):
            Circle(CROQUIS12_R)
    extrude(amount=-CORTAR_EXTRUIR5_DEPTH, mode=Mode.SUBTRACT)

    # Croquis13 → Cortar-Extruir6 (cut, two sides: drawn at the far end of the back side and taken through both)
    with BuildSketch(Plane.XY.offset(-CORTAR_EXTRUIR6_DEPTH_BACK)):
        with Locations((0, -105.833333333)):
            Circle(CROQUIS13_R)
    extrude(amount=CORTAR_EXTRUIR6_DEPTH + CORTAR_EXTRUIR6_DEPTH_BACK, mode=Mode.SUBTRACT)

    # Croquis14 → Saliente-Extruir4 (add)
    with BuildSketch(Plane(origin=(0, 0, 28.5), x_dir=(-1, 0, 0), z_dir=(0, 0, -1))):
        with BuildLine():
            Line((-12.5, -30.5), (-12.5, -17))
            Line((-12.5, -17), (12.5, -17))
            Line((12.5, -17), (12.5, -30.5))
            ThreePointArc((12.5, -30.5), (0, -43), (-12.5, -30.5))
        make_face()
        with Locations(Location((0, -30.5, 0), (0, 0, 180))):
            Circle(CROQUIS14_R, mode=Mode.SUBTRACT)
    saliente_extruir4 = extrude(amount=SALIENTE_EXTRUIR4_DEPTH)

    # Redondeo1
    redondeo1_edges = [part.edges().sort_by_distance(p)[0] for p in [
        (0, -43, 28.5),
        (-12.5, -23.75, 28.5),
        (12.5, -23.75, 28.5),
    ]]
    fillet(redondeo1_edges, radius=REDONDEO1_R)

    # Simetría4: Saliente-Extruir4 across plane
    add(saliente_extruir4.mirror(Plane.XY))

    # Simetría6
    split(bisect_by=Plane.XY, keep=Keep.TOP)

    # Simetr_a6 2: part across plane


with BuildPart() as part_1:
    add(part.part)
    add(part.part.mirror(Plane.XY))

    # Croquis15 → Cortar-Extruir7 (cut, symmetric)
    with BuildSketch(Plane(origin=(0, 0, -31.5), x_dir=(-1, 0, 0), z_dir=(0, 0, -1))):
        with Locations((0, -30.5)):
            Circle(CROQUIS15_R)
        with Locations((0, -30.5)):
            Circle(CROQUIS15_R_2, mode=Mode.SUBTRACT)
    cortar_extruir7 = extrude(amount=CORTAR_EXTRUIR7_DEPTH, both=True, mode=Mode.SUBTRACT)

    # Simetría7: Cortar-Extruir7 across plane
    add(cortar_extruir7.mirror(Plane.XY), mode=Mode.SUBTRACT)


solid = part_1.part
